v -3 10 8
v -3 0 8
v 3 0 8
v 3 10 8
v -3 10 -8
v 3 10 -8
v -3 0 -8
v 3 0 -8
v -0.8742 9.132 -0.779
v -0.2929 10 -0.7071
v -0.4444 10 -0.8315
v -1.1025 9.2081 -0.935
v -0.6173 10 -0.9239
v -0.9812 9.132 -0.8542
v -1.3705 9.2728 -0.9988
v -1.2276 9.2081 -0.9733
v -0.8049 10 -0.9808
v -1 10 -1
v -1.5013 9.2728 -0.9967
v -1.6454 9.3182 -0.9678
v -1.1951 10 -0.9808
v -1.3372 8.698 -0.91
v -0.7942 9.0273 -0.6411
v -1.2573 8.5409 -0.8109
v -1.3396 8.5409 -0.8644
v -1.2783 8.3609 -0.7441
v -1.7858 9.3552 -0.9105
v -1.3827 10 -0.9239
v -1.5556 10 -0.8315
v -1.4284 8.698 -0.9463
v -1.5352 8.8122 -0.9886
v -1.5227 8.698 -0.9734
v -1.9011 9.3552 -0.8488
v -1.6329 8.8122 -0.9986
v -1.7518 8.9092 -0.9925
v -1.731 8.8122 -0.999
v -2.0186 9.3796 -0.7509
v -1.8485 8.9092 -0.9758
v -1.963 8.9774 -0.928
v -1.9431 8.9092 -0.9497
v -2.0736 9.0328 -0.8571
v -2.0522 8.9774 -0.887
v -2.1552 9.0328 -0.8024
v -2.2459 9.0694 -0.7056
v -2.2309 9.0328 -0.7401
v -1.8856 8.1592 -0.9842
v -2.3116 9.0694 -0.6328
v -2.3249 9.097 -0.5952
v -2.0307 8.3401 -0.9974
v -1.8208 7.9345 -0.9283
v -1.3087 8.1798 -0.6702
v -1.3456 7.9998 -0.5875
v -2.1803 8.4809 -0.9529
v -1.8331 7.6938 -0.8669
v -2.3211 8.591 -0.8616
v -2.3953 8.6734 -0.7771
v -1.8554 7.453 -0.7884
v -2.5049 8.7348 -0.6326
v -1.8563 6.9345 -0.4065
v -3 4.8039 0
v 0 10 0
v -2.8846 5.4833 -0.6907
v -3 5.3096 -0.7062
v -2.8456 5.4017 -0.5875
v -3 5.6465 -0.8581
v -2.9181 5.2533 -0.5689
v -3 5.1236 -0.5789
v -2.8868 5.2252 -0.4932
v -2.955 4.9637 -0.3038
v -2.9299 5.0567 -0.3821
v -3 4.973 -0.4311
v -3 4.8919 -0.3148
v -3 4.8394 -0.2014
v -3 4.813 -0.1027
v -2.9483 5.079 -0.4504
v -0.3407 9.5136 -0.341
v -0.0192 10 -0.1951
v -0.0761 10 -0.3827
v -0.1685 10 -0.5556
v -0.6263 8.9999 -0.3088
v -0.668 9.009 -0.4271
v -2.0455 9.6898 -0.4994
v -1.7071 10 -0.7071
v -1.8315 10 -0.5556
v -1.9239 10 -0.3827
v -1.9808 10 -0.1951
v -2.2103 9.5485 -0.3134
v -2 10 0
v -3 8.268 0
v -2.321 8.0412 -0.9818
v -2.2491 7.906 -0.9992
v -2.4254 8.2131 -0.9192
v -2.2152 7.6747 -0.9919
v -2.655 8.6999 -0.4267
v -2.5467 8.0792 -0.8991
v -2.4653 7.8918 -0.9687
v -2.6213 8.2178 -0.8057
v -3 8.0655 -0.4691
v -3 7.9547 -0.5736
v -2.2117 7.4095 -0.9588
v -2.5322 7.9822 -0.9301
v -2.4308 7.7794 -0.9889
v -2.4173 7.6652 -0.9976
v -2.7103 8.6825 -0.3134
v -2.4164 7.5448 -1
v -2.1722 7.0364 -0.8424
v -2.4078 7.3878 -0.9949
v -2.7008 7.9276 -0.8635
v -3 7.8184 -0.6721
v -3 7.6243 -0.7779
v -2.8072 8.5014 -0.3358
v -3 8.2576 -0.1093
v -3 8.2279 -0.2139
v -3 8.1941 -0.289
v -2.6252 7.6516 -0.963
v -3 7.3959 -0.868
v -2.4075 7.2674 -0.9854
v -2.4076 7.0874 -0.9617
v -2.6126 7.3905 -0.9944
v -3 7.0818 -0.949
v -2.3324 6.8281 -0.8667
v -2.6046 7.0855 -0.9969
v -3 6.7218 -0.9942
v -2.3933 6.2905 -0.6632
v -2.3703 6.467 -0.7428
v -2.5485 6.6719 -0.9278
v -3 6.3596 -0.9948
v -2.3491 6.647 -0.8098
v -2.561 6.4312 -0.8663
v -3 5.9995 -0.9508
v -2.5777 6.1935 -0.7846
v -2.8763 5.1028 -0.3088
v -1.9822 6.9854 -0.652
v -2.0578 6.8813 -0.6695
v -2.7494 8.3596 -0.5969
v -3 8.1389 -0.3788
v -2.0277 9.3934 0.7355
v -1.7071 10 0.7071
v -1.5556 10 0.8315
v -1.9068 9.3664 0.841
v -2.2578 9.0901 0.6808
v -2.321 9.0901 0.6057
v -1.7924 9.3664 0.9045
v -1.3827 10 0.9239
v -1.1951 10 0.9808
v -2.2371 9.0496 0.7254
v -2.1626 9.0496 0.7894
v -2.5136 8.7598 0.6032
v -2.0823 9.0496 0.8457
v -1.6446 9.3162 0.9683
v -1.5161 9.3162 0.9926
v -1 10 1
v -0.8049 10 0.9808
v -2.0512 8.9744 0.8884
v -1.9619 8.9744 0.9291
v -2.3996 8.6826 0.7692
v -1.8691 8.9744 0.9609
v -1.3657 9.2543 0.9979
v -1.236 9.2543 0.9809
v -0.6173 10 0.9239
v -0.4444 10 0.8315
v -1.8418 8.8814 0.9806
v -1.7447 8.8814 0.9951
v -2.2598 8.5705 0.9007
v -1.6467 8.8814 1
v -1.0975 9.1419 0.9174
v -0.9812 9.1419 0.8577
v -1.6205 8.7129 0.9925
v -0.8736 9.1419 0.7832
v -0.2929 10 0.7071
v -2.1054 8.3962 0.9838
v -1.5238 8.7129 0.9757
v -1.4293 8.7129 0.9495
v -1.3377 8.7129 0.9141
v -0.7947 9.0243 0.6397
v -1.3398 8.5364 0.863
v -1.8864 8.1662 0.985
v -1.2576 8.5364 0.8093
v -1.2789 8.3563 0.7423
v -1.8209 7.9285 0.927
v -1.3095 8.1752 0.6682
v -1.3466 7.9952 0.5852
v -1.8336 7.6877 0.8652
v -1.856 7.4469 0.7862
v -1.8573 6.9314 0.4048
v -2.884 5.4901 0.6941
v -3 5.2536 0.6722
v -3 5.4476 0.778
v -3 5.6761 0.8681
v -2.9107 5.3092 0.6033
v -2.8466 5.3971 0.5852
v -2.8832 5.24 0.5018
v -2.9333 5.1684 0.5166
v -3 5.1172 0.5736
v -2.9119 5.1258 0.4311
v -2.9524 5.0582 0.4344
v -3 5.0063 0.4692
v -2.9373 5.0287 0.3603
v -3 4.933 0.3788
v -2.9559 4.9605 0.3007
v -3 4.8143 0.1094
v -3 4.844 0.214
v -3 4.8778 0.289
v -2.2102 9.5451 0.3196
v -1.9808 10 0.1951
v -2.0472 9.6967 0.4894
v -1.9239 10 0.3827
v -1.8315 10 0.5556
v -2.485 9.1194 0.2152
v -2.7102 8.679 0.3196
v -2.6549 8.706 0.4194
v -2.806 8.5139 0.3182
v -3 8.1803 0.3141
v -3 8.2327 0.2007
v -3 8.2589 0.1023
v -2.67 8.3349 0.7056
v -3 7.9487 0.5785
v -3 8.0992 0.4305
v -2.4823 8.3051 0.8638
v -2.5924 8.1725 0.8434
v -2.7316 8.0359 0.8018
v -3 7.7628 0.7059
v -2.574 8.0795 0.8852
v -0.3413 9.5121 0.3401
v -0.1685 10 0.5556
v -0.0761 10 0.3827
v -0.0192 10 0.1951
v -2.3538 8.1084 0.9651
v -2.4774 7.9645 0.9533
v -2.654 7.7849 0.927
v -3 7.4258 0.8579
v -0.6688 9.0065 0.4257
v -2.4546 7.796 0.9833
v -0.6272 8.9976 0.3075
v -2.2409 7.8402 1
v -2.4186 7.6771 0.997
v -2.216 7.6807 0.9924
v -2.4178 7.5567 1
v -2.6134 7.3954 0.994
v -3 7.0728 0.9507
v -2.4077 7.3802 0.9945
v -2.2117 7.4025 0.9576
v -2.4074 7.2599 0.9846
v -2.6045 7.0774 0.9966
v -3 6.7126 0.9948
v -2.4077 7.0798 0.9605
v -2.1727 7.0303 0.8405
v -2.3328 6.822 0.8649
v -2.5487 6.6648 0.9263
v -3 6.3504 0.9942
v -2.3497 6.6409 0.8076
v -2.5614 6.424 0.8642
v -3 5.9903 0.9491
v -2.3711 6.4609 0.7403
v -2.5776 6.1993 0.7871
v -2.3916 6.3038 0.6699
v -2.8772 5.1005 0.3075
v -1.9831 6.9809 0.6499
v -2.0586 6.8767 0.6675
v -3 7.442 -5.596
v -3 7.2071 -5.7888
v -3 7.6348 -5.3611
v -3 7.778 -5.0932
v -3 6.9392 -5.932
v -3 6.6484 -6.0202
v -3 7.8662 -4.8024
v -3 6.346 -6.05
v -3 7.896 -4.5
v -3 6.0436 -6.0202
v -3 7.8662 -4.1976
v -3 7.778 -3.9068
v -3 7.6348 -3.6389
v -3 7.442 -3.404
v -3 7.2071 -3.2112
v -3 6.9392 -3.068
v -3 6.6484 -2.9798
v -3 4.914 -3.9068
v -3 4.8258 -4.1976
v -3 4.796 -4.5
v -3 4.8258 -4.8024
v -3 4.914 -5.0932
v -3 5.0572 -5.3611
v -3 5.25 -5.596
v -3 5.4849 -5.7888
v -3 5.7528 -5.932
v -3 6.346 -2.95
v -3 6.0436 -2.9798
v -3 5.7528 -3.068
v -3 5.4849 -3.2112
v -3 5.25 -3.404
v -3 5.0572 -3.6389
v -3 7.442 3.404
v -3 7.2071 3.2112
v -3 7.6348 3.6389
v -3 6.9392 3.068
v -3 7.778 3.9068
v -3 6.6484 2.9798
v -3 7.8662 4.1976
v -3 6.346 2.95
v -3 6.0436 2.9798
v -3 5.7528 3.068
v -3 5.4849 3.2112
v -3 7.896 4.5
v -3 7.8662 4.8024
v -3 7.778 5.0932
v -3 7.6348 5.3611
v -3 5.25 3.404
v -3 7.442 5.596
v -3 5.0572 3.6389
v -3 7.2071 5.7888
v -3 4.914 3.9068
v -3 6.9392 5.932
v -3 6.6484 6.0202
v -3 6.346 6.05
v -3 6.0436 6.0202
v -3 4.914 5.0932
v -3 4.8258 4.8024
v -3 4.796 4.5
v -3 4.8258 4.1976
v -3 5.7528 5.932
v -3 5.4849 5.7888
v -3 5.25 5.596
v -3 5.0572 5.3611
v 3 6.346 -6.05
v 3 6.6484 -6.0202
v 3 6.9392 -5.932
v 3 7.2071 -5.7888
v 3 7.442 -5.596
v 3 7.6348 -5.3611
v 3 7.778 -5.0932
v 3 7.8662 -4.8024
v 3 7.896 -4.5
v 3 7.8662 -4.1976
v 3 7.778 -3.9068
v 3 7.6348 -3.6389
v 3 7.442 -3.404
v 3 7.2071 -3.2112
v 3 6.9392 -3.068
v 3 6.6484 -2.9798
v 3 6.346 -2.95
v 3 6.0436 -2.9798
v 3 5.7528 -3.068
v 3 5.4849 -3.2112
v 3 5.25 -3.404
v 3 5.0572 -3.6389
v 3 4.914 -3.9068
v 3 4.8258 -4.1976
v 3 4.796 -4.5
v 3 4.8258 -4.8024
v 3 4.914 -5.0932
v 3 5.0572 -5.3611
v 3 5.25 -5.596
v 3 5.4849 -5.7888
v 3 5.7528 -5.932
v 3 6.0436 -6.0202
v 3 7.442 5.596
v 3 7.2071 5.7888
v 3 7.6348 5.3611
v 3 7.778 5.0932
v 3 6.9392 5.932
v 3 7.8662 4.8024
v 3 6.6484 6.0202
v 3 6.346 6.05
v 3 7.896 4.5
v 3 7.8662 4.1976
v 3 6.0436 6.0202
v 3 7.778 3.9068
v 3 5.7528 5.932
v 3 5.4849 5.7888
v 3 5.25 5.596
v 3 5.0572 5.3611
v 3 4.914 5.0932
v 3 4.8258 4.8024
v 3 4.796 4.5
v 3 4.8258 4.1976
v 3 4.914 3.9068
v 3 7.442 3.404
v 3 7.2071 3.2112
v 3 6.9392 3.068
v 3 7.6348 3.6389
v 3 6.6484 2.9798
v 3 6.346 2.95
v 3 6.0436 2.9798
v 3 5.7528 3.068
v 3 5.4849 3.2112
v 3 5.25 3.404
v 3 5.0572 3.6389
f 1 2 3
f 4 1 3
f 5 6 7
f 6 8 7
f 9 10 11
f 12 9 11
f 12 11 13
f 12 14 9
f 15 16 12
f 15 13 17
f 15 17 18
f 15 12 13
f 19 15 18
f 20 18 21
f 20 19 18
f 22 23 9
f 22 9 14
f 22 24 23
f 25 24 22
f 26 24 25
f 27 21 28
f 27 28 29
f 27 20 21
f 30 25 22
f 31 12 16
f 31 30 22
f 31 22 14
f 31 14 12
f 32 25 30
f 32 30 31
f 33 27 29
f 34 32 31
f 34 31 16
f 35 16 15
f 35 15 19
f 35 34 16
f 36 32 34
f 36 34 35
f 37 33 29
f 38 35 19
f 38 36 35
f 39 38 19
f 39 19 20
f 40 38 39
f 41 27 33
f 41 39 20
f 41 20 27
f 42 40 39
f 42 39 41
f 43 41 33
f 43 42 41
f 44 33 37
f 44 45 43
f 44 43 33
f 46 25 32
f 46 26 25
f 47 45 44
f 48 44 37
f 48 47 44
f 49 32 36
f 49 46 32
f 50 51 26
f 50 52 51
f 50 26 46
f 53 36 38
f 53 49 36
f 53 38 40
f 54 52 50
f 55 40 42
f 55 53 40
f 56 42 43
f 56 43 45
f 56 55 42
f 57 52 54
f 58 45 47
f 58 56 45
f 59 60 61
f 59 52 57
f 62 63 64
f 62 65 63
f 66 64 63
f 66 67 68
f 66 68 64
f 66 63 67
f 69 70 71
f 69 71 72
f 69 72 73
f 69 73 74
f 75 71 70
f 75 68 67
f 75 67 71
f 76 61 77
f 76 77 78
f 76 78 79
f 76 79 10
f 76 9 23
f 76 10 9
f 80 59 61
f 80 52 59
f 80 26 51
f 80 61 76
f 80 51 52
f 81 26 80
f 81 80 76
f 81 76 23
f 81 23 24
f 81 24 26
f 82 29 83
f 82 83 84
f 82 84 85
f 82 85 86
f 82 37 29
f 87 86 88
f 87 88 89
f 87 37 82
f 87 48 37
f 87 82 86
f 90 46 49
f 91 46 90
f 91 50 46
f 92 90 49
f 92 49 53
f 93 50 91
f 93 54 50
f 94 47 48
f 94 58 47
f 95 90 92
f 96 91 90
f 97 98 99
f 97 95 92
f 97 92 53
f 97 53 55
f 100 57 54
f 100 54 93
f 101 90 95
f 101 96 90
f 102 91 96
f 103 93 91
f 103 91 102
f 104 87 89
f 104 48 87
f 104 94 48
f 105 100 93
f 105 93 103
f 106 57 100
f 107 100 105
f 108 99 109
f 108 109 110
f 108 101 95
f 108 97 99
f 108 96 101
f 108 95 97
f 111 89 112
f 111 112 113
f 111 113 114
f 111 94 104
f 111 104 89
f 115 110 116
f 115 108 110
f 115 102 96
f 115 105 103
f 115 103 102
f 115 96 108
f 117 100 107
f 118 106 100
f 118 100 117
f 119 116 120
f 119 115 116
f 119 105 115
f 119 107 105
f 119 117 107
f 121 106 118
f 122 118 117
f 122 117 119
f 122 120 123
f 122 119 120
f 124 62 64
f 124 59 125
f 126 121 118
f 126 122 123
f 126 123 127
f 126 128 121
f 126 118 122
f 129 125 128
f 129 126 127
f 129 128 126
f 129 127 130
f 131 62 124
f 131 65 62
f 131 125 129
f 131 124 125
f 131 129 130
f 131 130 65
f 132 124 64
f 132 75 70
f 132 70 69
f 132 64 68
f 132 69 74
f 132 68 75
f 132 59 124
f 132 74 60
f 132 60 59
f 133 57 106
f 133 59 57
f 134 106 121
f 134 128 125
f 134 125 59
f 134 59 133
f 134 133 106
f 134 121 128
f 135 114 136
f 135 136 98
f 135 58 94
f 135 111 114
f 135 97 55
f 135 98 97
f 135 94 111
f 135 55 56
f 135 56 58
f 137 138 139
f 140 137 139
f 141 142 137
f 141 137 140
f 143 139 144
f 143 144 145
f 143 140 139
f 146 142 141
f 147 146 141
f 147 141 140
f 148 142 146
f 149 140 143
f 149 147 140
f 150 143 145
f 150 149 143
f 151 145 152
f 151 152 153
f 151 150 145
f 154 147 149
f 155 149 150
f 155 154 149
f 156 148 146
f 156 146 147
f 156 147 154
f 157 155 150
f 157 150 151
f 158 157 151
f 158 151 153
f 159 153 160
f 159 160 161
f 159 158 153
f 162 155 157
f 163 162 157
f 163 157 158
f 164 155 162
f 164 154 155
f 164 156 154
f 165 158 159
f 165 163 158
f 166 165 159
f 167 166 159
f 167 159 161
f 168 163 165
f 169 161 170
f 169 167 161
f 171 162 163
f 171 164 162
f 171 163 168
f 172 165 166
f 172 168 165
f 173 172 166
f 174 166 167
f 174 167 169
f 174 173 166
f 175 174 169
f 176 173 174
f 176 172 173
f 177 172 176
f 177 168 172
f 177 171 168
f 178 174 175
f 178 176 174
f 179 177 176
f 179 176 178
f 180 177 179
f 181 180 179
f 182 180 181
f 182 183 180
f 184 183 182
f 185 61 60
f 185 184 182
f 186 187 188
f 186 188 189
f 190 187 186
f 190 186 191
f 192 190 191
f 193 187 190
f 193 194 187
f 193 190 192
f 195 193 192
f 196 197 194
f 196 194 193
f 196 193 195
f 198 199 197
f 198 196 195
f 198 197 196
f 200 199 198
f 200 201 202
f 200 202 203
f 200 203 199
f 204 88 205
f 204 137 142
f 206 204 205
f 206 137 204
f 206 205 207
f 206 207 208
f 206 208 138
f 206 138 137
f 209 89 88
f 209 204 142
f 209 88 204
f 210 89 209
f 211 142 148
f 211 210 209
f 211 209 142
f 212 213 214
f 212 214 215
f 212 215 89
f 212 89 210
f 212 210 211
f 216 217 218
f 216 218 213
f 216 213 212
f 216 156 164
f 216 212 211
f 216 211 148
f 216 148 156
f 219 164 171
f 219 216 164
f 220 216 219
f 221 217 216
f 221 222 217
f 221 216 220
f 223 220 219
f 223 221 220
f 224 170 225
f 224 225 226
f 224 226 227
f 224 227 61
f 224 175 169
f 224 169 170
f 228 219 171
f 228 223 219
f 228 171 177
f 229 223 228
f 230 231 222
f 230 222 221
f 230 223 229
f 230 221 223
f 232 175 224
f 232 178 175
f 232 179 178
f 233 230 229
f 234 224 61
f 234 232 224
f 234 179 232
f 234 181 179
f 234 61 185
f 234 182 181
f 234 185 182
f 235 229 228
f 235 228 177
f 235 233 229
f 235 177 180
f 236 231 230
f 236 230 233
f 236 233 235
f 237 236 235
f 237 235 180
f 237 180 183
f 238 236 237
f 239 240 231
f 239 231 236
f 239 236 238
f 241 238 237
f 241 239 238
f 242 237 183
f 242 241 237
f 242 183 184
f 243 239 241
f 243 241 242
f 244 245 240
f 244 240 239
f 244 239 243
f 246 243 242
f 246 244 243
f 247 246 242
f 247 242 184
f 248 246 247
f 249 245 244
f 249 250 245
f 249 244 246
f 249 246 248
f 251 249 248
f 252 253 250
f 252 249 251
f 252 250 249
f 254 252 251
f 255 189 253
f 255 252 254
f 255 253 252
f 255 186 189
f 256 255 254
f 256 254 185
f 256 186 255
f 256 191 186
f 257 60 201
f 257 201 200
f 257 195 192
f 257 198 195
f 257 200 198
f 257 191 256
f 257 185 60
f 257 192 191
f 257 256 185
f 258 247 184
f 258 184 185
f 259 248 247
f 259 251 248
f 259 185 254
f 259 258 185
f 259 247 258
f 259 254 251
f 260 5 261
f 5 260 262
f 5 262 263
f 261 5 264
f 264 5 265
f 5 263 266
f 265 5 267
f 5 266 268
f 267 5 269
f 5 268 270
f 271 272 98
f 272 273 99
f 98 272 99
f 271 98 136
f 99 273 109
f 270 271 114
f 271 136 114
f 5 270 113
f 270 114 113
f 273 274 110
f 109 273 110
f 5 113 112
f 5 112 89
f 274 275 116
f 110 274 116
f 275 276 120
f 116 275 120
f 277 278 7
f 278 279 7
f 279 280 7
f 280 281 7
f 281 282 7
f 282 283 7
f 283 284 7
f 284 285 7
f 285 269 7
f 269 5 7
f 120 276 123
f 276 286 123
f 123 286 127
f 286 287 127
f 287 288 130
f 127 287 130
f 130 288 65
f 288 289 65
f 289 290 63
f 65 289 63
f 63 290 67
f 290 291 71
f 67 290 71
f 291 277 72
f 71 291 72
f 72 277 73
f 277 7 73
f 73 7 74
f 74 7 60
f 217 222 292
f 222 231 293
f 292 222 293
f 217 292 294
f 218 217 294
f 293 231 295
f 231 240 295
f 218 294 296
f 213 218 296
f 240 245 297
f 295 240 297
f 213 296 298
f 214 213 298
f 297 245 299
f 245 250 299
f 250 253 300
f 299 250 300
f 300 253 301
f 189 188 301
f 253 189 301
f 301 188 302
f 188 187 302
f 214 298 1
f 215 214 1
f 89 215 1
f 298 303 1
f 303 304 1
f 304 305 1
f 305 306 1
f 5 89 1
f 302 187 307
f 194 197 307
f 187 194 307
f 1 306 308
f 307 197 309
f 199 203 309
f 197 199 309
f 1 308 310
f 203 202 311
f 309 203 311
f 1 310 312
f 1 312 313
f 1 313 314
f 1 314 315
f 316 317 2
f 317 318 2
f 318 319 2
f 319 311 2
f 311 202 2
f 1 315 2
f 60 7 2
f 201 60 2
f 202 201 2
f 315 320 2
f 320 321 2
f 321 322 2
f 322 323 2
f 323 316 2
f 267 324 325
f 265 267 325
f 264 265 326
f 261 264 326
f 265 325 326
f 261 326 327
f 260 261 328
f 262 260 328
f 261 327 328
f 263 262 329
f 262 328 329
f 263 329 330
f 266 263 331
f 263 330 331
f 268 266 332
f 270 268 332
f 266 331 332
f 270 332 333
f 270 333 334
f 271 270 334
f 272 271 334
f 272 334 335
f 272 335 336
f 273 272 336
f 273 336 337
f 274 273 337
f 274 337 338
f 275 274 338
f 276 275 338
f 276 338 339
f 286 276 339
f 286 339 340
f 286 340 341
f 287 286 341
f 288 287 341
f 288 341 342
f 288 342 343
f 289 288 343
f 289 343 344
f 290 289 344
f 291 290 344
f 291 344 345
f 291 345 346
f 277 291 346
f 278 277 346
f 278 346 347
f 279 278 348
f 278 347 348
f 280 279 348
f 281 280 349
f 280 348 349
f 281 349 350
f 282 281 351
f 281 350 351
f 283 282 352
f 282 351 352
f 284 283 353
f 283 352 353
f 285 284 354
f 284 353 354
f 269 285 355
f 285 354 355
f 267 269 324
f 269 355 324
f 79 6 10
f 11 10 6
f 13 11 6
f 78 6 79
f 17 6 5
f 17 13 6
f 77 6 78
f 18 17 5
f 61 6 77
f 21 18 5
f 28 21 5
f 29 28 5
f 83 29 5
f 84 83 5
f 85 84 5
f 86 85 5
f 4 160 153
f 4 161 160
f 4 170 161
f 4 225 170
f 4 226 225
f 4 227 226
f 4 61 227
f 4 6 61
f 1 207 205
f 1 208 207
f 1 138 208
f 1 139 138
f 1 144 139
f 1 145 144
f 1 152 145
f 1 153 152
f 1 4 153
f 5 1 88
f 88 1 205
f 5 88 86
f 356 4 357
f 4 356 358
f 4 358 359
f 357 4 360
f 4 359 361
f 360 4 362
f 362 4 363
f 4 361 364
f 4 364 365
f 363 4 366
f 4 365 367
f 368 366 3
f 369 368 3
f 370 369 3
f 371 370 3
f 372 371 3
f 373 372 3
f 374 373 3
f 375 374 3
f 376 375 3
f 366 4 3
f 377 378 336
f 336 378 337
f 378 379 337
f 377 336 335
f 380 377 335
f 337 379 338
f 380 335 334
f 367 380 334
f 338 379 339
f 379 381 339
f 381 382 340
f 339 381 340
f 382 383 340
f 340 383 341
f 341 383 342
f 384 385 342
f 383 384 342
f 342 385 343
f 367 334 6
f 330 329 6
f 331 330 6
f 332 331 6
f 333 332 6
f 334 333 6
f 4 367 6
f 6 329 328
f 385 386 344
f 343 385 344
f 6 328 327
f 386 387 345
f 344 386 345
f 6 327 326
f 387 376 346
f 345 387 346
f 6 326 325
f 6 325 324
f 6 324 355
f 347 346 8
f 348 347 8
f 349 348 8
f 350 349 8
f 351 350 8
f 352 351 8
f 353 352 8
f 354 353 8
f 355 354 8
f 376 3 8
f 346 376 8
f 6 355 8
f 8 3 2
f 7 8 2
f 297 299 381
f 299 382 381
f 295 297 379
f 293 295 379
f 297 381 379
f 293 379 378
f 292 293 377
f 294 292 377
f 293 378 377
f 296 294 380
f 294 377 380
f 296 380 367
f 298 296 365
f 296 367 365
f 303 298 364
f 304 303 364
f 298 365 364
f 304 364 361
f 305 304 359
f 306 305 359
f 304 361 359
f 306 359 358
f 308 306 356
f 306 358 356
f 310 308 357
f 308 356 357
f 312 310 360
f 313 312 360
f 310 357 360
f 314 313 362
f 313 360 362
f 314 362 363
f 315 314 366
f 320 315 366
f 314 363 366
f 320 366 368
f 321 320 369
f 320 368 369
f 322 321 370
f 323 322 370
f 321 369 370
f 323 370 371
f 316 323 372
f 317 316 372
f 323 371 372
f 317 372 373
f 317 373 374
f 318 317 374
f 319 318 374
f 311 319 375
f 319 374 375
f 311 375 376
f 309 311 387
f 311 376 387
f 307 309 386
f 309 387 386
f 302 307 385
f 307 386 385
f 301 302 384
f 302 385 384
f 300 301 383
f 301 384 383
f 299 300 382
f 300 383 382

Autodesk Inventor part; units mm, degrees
ref_plane "YZ Plane" through (0, 0, 0) normal (1, 0, 0) x (0, 1, 0)
ref_plane "XZ Plane" through (0, 0, 0) normal (0, 1, 0) x (-1, 0, 0)
ref_plane "XY Plane" through (0, 0, 0) normal (0, 0, 1) x (1, 0, 0)
sketch "Sketch1" plane through (0, 0, 0) normal (0, 1, 0) x (-1, 0, 0)
  line L0 (-3, -8) -> (3, -8)
  line L1 (3, -8) -> (3, 8)
  line L2 (3, 8) -> (-3, 8)
  line L3 (-3, 8) -> (-3, -8)
  line L4 (-3, -8) -> (3, 8) construction
  line L5 (3, -8) -> (-3, 8) construction
  point P0 (0, 0)
  dimension "d0" = 6
  dimension "d1" = 16
extrude "Extrusion1" add sketch "Sketch1" along normal blind 10
sketch "Sketch2" plane through (0, 10, 0) normal (0, 1, 0) x (1, 0, 0)
  line L0 (-3, 8) -> (-3, -8) projected
  line L1 (-3, 0) -> (-1, 0)
  circle A0 centre (-1, 0) radius 1
  point P0 (0, 0)
  dimension "d4" = 2
  dimension "d5" = 2
sketch "Sketch3" plane through (3, 0, -8) normal (0, 0, -1) x (-1, 0, 0)
  line L0 (6, 0) -> (6, 10) projected
  line L1 (6, 10) -> (10.4832, 2.2349)
  line L2 (6, 10) -> (14.9664, 10) construction
  point P0 (3, 0)
  dimension "d6" = 60
sweep "Sweep1" cut profiles "Sketch2" path "Sketch3" path curves L1
sketch "Sketch5" plane through (3, 0, 8) normal (1, 0, 0) x (0, 0, -1)
  circle A0 centre (3.5, 6.346) radius 2.85 projected
  circle A1 centre (3.5, 6.346) radius 1.55
  circle A2 centre (12.5, 6.346) radius 2.85 projected
  circle A3 centre (12.5, 6.346) radius 1.55
  point P0 (8, 0)
  dimension "d13" = 3.1
  dimension "d14" = 3.1
extrude "Extrusion3" cut sketch "Sketch5" against normal blind 10 contours A1 | A3
properties part number "middleFingerMale"
